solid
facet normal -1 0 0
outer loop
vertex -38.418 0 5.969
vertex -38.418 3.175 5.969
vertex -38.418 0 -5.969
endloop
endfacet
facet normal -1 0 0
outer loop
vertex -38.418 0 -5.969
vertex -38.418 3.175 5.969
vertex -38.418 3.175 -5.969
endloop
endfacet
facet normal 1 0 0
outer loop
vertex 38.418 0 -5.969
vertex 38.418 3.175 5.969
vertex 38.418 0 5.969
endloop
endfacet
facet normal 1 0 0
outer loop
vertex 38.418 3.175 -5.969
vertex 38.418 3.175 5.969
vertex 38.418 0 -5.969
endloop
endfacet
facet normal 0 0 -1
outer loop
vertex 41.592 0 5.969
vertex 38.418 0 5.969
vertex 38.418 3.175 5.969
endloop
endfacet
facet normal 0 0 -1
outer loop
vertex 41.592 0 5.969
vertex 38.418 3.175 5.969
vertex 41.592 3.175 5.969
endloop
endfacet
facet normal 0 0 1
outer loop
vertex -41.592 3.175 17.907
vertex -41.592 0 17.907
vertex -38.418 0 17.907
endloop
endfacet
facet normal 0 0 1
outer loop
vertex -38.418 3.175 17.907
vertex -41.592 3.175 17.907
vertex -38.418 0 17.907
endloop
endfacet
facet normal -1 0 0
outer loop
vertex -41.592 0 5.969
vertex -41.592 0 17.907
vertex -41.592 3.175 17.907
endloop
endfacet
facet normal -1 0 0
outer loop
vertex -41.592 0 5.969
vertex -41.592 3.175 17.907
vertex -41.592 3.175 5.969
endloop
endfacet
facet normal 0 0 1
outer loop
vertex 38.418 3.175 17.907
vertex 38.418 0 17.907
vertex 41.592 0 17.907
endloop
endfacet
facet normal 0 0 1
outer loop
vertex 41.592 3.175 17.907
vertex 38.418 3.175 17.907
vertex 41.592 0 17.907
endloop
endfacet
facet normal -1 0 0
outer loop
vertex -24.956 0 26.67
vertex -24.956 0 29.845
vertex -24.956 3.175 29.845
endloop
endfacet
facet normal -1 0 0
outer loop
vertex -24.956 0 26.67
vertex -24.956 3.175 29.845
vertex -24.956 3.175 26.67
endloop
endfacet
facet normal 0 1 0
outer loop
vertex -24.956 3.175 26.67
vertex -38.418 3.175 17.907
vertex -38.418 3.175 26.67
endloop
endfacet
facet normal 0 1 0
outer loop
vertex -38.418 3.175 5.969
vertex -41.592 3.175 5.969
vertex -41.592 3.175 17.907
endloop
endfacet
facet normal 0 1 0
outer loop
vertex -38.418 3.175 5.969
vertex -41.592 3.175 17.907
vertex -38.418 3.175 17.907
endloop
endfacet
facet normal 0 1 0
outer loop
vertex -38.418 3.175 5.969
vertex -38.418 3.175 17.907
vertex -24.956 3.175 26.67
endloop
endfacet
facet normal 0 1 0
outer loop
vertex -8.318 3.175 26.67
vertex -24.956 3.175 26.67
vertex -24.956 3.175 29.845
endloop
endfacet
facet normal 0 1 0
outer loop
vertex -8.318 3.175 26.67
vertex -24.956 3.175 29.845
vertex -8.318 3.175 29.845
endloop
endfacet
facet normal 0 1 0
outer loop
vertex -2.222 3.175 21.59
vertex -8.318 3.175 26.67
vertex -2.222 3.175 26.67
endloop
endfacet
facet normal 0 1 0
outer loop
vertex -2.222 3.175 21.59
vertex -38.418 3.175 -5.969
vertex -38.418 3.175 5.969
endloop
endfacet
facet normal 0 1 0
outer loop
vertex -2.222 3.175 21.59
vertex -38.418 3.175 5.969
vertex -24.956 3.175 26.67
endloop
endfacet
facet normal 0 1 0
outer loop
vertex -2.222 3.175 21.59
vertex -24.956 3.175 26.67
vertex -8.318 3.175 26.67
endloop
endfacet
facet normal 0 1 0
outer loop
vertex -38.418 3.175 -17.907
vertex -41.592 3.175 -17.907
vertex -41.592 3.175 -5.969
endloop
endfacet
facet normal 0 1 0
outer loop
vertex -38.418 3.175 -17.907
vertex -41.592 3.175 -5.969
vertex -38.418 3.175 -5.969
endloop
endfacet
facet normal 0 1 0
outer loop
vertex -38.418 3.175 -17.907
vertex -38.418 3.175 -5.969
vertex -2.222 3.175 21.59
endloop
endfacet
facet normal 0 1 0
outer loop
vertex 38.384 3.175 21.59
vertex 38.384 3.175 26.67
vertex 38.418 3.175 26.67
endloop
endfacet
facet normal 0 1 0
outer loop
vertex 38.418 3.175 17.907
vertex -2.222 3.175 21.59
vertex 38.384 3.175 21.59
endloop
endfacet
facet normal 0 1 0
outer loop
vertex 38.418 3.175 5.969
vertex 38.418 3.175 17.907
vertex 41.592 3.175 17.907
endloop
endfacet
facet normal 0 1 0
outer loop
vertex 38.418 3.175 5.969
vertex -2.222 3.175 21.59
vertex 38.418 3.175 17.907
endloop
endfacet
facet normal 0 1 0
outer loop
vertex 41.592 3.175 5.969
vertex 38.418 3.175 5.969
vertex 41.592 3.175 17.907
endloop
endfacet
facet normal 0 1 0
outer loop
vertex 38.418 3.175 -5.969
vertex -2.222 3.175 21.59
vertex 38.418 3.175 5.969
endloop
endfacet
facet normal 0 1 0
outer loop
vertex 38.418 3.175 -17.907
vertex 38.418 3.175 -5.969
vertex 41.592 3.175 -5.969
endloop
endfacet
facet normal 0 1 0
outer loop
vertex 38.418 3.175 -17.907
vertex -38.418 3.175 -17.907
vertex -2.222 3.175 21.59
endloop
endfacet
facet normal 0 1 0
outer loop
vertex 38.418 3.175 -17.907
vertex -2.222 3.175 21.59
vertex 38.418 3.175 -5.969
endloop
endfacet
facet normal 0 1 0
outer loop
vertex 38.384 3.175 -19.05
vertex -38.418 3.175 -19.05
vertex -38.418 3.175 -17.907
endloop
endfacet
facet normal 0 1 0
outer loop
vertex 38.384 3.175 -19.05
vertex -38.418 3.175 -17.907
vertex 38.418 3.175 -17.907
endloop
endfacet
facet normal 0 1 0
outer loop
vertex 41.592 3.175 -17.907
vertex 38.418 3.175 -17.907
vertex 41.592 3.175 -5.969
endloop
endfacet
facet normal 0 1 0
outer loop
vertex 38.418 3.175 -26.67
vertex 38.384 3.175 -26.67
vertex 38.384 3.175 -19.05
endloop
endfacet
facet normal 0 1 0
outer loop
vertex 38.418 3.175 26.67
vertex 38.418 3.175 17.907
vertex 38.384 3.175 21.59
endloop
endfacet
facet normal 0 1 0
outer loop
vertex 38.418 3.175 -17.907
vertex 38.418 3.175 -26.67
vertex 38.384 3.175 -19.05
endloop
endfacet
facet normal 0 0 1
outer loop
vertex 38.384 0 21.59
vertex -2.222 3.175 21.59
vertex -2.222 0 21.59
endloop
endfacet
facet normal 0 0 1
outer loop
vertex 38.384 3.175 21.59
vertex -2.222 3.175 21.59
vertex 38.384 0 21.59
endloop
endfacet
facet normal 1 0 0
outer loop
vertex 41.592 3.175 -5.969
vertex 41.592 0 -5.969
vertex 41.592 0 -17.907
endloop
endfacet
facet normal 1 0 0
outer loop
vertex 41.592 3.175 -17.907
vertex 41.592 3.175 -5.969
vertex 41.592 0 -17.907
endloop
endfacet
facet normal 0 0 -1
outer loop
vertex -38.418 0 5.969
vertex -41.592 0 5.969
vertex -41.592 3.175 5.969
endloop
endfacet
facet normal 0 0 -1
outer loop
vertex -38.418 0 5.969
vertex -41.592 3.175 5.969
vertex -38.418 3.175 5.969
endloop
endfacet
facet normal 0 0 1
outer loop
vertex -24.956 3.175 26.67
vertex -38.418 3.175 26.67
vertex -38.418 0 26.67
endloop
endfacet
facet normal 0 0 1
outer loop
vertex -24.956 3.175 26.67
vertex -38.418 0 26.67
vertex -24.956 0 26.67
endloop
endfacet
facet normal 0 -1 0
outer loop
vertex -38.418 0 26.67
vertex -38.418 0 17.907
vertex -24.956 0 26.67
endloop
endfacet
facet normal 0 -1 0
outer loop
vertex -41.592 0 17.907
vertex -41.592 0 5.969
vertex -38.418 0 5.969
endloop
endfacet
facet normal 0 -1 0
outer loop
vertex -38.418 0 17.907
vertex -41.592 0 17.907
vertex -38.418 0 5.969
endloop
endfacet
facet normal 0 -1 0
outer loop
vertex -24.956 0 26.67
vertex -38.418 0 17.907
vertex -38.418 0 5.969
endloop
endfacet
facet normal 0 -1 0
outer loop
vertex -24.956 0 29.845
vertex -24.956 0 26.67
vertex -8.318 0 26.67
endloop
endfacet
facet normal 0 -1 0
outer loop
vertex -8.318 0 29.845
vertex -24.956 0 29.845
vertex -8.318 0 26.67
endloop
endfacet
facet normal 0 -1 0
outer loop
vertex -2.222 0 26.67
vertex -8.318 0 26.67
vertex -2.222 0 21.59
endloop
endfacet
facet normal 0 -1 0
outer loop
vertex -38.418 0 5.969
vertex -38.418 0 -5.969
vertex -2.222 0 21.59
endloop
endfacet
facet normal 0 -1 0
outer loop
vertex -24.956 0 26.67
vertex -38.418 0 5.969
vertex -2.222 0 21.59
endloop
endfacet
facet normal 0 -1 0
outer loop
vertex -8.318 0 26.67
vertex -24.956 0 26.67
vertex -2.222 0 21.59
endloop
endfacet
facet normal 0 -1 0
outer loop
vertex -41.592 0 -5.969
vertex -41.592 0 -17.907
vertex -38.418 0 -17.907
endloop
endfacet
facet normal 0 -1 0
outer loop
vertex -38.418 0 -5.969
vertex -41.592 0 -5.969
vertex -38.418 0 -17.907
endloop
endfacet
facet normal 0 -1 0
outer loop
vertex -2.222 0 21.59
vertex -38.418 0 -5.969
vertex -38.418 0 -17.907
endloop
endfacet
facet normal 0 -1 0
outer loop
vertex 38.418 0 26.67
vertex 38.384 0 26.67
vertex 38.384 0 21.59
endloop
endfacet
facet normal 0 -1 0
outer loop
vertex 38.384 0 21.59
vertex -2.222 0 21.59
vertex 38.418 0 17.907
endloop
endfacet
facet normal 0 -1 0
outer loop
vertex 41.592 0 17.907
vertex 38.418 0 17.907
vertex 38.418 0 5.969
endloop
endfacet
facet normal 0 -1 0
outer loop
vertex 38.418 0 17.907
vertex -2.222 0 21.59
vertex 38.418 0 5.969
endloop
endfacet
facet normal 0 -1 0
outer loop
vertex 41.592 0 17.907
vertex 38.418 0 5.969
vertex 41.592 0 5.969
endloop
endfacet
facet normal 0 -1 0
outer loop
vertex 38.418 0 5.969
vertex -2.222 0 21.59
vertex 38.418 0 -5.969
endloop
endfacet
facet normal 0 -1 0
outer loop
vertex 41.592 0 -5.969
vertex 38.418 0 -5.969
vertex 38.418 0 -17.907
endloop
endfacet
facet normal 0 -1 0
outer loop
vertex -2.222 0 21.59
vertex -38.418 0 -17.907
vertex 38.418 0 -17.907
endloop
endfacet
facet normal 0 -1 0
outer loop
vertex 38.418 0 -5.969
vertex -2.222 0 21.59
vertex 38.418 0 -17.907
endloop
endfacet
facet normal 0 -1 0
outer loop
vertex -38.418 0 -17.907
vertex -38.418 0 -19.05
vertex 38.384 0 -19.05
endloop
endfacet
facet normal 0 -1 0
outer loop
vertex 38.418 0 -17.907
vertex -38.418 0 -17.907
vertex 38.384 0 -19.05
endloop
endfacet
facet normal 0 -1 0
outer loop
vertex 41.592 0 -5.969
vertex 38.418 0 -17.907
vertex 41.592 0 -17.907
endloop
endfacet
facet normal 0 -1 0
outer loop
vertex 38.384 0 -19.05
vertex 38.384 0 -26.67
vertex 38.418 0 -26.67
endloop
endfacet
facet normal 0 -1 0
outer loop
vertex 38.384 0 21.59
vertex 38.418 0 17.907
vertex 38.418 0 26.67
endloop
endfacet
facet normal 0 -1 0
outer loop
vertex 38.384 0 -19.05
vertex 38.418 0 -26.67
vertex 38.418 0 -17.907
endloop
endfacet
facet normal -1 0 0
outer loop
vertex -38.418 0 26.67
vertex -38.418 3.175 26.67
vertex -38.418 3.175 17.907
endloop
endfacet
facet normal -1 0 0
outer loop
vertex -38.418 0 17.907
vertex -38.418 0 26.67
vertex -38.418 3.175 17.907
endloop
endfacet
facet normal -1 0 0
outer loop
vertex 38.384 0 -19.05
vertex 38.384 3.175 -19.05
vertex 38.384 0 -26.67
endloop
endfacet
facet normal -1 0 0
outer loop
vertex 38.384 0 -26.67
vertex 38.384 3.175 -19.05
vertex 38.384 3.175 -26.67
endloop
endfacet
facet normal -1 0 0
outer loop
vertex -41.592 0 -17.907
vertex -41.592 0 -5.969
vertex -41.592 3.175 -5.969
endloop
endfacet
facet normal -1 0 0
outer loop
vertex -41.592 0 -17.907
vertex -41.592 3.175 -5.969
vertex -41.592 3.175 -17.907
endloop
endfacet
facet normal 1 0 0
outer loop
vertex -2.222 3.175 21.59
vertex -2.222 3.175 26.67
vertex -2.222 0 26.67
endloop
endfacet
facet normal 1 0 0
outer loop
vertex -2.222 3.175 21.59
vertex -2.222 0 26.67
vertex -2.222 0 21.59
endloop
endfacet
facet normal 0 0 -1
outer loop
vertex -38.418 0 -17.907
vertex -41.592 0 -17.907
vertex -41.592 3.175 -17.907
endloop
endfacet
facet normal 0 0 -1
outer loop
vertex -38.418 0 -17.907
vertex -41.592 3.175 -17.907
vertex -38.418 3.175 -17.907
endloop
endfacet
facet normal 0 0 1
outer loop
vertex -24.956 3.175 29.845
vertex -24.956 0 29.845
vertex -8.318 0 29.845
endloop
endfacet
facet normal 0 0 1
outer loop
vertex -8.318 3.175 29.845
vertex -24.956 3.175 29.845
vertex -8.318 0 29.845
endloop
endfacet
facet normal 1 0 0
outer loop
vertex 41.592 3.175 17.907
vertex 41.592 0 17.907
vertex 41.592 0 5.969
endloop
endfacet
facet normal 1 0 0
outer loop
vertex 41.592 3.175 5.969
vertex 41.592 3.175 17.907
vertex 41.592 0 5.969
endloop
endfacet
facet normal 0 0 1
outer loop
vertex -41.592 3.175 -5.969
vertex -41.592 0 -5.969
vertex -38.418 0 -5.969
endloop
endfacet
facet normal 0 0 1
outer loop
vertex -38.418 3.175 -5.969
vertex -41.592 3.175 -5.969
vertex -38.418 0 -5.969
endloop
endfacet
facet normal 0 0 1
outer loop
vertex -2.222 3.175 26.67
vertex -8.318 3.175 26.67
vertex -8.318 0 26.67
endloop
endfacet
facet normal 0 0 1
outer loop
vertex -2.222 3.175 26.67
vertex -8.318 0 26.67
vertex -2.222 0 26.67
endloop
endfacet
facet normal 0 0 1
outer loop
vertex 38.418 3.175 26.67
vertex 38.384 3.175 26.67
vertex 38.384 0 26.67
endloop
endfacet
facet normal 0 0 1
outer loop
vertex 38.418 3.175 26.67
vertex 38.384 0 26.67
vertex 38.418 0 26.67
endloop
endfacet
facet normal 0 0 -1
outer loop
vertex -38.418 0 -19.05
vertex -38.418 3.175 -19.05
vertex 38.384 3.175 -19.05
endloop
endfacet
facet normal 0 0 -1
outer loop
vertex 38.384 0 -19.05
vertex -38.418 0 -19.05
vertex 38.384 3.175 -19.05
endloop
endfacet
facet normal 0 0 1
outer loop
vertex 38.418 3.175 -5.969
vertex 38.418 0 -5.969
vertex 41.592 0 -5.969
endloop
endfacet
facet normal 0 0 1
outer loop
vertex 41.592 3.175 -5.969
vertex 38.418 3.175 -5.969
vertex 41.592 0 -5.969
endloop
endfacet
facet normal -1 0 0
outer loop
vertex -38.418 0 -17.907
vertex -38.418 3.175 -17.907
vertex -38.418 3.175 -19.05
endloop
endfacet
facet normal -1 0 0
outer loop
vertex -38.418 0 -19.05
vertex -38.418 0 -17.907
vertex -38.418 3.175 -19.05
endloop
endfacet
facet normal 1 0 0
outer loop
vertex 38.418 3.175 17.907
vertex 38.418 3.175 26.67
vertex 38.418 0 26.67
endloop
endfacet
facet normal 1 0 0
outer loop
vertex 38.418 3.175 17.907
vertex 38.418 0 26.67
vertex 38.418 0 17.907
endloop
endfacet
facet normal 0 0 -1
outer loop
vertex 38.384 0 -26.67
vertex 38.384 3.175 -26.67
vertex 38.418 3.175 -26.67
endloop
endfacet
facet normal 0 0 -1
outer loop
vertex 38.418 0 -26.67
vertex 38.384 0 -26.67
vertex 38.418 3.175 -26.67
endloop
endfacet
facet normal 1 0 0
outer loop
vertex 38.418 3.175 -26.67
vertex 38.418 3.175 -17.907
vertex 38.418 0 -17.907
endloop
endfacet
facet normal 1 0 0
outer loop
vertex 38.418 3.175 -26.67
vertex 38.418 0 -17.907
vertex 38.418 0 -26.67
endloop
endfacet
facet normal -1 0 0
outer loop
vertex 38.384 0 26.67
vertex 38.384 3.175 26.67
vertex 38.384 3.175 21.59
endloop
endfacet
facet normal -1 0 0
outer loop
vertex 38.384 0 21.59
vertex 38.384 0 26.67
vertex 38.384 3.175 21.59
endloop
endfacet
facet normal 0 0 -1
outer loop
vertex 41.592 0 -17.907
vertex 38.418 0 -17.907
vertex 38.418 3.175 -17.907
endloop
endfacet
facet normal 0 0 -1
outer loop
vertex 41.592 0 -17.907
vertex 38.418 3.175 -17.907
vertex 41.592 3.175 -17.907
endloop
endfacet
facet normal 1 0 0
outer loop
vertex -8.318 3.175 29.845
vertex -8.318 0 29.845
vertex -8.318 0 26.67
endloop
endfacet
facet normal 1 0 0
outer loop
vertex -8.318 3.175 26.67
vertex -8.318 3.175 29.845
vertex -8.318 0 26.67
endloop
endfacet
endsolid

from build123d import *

# Parameters (mm, degrees)
SKETCH1_W           = 83.185
SKETCH1_H           = 59.69
BOSS_EXTRUDE1_DEPTH = 3.175
SKETCH2_W           = 16.637
SKETCH2_H           = 3.175
CUT_EXTRUDE1_DEPTH  = 3.175
LPATTERN1_COUNT     = 3
LPATTERN1_PITCH     = 33.274
SKETCH3_W           = 3.175
SKETCH3_H           = 11.938
CUT_EXTRUDE2_DEPTH  = 3.175
LPATTERN4_COUNT     = 3
LPATTERN4_PITCH     = 23.876
SKETCH5_W           = 76.801567088
SKETCH5_H           = 11.204108434
SKETCH5_W_2         = 40.606567088
SKETCH5_H_2         = 13.017856784
CUT_EXTRUDE4_DEPTH  = 3.175


with BuildPart() as part:
    # Sketch1 → Boss-Extrude1 (new body)
    with BuildSketch(Plane(origin=(0, 0, 0), x_dir=(1, 0, 0), z_dir=(0, 1, 0))):
        Rectangle(SKETCH1_W, SKETCH1_H)
    extrude(amount=BOSS_EXTRUDE1_DEPTH)

    # Sketch2 → Cut-Extrude1 (cut)
    with BuildSketch(Plane(origin=(0, 3.175, 0), x_dir=(1, 0, 0), z_dir=(0, 1, 0))):
        with Locations((-33.274, 28.2575)):
            Rectangle(SKETCH2_W, SKETCH2_H)
        with Locations((-33.274, -28.2575)):
            Rectangle(SKETCH2_W, SKETCH2_H)
    cut_extrude1 = extrude(amount=-CUT_EXTRUDE1_DEPTH, mode=Mode.SUBTRACT)

    # LPattern1: Cut-Extrude1 ×3
    with Locations(*[(i * LPATTERN1_PITCH, 0, 0) for i in range(1, LPATTERN1_COUNT)]):
        add(cut_extrude1, mode=Mode.SUBTRACT)

    # Sketch3 → Cut-Extrude2 (cut)
    with BuildSketch(Plane(origin=(0, 3.175, 0), x_dir=(1, 0, 0), z_dir=(0, 1, 0))):
        with Locations((-40.005, 23.876)):
            Rectangle(SKETCH3_W, SKETCH3_H)
        with Locations((40.005, 23.876)):
            Rectangle(SKETCH3_W, SKETCH3_H)
    cut_extrude2 = extrude(amount=-CUT_EXTRUDE2_DEPTH, mode=Mode.SUBTRACT)

    # LPattern4: Cut-Extrude2 ×3
    with Locations(*[(0, 0, i * LPATTERN4_PITCH) for i in range(1, LPATTERN4_COUNT)]):
        add(cut_extrude2, mode=Mode.SUBTRACT)

    # Sketch5 → Cut-Extrude4 (cut)
    with BuildSketch(Plane(origin=(0, 3.175, 0), x_dir=(1, 0, 0), z_dir=(0, 1, 0))):
        with Locations((-0.016716456, 24.652054217)):
            Rectangle(SKETCH5_W, SKETCH5_H)
        with Locations((18.080783544, -28.098928392)):
            Rectangle(SKETCH5_W_2, SKETCH5_H_2)
    extrude(amount=-CUT_EXTRUDE4_DEPTH, mode=Mode.SUBTRACT)


solid = part.part
